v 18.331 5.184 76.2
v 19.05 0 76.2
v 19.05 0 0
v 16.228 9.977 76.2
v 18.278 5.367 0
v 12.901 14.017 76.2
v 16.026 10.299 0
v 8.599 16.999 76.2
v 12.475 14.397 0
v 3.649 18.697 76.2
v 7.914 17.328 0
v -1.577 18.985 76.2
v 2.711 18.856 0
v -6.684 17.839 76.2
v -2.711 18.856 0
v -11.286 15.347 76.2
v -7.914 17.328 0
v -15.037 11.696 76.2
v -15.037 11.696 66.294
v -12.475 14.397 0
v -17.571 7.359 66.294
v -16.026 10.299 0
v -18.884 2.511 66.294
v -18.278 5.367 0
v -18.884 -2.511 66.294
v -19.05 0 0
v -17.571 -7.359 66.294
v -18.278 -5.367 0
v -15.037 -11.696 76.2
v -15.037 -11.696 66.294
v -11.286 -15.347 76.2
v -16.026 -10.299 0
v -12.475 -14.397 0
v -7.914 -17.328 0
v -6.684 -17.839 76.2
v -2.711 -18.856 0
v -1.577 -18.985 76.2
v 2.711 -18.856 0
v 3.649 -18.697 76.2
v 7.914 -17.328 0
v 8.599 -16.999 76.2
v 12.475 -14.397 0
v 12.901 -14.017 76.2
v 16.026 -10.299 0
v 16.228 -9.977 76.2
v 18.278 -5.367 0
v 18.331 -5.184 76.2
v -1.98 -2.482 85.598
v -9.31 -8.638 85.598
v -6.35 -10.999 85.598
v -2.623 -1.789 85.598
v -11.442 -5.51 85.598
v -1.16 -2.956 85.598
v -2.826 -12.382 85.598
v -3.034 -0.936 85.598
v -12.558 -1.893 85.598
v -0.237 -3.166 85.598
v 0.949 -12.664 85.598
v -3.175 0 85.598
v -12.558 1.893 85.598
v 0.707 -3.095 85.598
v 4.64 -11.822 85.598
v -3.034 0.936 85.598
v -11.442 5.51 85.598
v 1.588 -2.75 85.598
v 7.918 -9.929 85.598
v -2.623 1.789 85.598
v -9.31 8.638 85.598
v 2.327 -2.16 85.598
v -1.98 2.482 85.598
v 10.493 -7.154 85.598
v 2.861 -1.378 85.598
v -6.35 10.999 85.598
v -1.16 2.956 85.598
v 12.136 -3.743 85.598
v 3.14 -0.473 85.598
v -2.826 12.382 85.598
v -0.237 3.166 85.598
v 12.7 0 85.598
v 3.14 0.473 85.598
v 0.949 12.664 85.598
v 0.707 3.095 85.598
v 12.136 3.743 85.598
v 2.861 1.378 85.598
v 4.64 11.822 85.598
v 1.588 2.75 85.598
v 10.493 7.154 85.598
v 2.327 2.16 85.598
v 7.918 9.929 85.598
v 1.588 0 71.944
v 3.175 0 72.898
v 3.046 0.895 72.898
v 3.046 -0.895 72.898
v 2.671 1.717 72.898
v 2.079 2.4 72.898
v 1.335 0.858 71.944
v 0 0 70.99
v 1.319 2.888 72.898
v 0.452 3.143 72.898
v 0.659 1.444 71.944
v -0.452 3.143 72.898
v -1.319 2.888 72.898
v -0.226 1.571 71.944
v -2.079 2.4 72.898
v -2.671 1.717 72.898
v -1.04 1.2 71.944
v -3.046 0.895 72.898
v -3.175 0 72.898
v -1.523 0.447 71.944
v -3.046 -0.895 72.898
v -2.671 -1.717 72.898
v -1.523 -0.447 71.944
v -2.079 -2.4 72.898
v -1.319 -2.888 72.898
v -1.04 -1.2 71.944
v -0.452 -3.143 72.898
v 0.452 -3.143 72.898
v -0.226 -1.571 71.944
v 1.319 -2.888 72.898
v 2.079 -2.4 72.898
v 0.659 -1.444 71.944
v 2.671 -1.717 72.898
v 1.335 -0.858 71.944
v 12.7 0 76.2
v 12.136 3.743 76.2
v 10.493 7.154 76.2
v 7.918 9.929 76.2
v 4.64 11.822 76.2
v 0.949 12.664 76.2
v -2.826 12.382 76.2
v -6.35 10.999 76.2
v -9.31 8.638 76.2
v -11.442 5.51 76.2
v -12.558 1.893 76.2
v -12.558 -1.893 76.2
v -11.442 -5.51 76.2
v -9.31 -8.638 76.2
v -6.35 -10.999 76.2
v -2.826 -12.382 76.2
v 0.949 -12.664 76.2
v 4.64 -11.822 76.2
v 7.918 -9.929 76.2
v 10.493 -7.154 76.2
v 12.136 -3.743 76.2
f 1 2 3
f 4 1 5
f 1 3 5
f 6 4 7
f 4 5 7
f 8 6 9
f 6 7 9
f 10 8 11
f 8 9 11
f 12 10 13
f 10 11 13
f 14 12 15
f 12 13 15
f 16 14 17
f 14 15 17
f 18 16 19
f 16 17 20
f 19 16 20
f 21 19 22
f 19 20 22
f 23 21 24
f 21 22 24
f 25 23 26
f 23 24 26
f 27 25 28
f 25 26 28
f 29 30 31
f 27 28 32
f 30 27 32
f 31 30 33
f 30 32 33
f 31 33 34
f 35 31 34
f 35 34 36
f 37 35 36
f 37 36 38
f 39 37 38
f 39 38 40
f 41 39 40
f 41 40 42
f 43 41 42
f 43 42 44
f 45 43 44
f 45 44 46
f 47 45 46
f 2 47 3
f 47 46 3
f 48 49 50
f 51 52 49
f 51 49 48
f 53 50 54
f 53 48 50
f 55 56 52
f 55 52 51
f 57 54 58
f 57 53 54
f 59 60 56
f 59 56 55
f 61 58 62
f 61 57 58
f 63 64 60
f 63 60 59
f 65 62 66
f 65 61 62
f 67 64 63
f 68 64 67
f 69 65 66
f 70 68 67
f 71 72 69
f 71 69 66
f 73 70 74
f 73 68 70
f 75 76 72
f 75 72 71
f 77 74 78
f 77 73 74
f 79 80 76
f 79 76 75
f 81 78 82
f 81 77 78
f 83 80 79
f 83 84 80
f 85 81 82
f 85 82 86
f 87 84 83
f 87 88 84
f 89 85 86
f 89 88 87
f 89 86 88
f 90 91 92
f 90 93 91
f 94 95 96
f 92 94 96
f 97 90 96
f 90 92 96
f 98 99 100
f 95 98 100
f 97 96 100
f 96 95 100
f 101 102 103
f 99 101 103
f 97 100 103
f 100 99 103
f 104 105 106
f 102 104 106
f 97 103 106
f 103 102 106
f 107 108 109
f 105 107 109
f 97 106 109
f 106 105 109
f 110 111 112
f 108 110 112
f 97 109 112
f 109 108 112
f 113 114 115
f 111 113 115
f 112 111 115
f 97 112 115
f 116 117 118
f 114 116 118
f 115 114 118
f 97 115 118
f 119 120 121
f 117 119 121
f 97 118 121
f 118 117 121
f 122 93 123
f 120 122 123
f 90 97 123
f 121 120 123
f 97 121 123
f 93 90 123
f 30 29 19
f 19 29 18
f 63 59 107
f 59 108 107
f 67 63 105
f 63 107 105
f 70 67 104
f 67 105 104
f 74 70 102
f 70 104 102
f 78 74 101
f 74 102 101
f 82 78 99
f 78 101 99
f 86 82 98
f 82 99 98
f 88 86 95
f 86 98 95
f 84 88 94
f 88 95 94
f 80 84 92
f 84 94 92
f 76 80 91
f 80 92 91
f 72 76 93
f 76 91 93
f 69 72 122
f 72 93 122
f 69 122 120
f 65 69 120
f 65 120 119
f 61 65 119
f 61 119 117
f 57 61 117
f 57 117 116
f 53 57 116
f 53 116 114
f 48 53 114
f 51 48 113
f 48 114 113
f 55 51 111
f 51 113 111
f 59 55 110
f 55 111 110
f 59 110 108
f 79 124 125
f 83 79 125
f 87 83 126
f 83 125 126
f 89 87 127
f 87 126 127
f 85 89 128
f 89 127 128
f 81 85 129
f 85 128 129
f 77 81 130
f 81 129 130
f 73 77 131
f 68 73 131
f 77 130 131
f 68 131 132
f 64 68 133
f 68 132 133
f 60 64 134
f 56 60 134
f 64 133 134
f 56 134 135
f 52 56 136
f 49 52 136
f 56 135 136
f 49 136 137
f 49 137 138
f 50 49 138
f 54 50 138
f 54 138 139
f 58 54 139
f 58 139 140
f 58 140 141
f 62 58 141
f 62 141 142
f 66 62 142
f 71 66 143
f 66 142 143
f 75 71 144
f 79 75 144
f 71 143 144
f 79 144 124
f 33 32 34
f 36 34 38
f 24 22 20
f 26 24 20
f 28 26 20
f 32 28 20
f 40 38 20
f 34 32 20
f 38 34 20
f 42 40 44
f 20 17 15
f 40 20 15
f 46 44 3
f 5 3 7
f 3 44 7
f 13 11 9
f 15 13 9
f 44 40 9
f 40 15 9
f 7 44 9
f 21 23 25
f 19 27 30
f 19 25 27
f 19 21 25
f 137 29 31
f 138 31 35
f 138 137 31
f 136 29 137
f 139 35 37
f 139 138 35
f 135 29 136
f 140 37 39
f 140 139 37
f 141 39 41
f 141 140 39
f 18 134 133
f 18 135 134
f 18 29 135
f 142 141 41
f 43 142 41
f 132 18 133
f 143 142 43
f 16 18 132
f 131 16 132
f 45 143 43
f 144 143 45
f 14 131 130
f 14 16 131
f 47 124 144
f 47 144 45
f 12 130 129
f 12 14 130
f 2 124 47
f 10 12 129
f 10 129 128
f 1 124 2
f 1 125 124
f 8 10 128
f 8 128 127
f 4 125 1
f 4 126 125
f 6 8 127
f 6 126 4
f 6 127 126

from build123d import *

# Parameters (mm, degrees)
F0_R     = 19.05
F1_DEPTH = 76.2
F2_R     = 12.7
F3_DEPTH = 9.398
F5_DEPTH = 19.304
F7_D     = 6.35
F7_DEPTH = 12.7
F7_TIP   = 1.9077324654


with BuildPart() as f1:
    # F0 (on Top) → F1 (new body)
    with BuildSketch(Plane.XY):
        Circle(F0_R)
    extrude(amount=F1_DEPTH)

    # F2 (on face) → F3 (join)
    with BuildSketch(Plane.XY.offset(76.2)):
        Circle(F2_R)
    extrude(amount=F3_DEPTH)

    # F4 (on face) → F5 (cut)
    with BuildSketch(Plane.XY.offset(85.598)):
        with BuildLine():
            Line((-15.0368, -12.6474779099), (-15.0368, 12.6474779099))
            ThreePointArc((-15.0368, 12.6474779099), (-19.6485127102, 0), (-15.0368, -12.6474779099))
        make_face()
    extrude(amount=-F5_DEPTH, mode=Mode.SUBTRACT)

    # F7
    with Locations(Plane.XY.offset(85.598)):
        with Locations((0, 0)):
            Hole(F7_D / 2, depth=F7_DEPTH)
            with Locations((0, 0, -(F7_DEPTH + F7_TIP / 2))):  # 118° drill point
                Cone(0, F7_D / 2, F7_TIP, mode=Mode.SUBTRACT)


solid = f1.part
